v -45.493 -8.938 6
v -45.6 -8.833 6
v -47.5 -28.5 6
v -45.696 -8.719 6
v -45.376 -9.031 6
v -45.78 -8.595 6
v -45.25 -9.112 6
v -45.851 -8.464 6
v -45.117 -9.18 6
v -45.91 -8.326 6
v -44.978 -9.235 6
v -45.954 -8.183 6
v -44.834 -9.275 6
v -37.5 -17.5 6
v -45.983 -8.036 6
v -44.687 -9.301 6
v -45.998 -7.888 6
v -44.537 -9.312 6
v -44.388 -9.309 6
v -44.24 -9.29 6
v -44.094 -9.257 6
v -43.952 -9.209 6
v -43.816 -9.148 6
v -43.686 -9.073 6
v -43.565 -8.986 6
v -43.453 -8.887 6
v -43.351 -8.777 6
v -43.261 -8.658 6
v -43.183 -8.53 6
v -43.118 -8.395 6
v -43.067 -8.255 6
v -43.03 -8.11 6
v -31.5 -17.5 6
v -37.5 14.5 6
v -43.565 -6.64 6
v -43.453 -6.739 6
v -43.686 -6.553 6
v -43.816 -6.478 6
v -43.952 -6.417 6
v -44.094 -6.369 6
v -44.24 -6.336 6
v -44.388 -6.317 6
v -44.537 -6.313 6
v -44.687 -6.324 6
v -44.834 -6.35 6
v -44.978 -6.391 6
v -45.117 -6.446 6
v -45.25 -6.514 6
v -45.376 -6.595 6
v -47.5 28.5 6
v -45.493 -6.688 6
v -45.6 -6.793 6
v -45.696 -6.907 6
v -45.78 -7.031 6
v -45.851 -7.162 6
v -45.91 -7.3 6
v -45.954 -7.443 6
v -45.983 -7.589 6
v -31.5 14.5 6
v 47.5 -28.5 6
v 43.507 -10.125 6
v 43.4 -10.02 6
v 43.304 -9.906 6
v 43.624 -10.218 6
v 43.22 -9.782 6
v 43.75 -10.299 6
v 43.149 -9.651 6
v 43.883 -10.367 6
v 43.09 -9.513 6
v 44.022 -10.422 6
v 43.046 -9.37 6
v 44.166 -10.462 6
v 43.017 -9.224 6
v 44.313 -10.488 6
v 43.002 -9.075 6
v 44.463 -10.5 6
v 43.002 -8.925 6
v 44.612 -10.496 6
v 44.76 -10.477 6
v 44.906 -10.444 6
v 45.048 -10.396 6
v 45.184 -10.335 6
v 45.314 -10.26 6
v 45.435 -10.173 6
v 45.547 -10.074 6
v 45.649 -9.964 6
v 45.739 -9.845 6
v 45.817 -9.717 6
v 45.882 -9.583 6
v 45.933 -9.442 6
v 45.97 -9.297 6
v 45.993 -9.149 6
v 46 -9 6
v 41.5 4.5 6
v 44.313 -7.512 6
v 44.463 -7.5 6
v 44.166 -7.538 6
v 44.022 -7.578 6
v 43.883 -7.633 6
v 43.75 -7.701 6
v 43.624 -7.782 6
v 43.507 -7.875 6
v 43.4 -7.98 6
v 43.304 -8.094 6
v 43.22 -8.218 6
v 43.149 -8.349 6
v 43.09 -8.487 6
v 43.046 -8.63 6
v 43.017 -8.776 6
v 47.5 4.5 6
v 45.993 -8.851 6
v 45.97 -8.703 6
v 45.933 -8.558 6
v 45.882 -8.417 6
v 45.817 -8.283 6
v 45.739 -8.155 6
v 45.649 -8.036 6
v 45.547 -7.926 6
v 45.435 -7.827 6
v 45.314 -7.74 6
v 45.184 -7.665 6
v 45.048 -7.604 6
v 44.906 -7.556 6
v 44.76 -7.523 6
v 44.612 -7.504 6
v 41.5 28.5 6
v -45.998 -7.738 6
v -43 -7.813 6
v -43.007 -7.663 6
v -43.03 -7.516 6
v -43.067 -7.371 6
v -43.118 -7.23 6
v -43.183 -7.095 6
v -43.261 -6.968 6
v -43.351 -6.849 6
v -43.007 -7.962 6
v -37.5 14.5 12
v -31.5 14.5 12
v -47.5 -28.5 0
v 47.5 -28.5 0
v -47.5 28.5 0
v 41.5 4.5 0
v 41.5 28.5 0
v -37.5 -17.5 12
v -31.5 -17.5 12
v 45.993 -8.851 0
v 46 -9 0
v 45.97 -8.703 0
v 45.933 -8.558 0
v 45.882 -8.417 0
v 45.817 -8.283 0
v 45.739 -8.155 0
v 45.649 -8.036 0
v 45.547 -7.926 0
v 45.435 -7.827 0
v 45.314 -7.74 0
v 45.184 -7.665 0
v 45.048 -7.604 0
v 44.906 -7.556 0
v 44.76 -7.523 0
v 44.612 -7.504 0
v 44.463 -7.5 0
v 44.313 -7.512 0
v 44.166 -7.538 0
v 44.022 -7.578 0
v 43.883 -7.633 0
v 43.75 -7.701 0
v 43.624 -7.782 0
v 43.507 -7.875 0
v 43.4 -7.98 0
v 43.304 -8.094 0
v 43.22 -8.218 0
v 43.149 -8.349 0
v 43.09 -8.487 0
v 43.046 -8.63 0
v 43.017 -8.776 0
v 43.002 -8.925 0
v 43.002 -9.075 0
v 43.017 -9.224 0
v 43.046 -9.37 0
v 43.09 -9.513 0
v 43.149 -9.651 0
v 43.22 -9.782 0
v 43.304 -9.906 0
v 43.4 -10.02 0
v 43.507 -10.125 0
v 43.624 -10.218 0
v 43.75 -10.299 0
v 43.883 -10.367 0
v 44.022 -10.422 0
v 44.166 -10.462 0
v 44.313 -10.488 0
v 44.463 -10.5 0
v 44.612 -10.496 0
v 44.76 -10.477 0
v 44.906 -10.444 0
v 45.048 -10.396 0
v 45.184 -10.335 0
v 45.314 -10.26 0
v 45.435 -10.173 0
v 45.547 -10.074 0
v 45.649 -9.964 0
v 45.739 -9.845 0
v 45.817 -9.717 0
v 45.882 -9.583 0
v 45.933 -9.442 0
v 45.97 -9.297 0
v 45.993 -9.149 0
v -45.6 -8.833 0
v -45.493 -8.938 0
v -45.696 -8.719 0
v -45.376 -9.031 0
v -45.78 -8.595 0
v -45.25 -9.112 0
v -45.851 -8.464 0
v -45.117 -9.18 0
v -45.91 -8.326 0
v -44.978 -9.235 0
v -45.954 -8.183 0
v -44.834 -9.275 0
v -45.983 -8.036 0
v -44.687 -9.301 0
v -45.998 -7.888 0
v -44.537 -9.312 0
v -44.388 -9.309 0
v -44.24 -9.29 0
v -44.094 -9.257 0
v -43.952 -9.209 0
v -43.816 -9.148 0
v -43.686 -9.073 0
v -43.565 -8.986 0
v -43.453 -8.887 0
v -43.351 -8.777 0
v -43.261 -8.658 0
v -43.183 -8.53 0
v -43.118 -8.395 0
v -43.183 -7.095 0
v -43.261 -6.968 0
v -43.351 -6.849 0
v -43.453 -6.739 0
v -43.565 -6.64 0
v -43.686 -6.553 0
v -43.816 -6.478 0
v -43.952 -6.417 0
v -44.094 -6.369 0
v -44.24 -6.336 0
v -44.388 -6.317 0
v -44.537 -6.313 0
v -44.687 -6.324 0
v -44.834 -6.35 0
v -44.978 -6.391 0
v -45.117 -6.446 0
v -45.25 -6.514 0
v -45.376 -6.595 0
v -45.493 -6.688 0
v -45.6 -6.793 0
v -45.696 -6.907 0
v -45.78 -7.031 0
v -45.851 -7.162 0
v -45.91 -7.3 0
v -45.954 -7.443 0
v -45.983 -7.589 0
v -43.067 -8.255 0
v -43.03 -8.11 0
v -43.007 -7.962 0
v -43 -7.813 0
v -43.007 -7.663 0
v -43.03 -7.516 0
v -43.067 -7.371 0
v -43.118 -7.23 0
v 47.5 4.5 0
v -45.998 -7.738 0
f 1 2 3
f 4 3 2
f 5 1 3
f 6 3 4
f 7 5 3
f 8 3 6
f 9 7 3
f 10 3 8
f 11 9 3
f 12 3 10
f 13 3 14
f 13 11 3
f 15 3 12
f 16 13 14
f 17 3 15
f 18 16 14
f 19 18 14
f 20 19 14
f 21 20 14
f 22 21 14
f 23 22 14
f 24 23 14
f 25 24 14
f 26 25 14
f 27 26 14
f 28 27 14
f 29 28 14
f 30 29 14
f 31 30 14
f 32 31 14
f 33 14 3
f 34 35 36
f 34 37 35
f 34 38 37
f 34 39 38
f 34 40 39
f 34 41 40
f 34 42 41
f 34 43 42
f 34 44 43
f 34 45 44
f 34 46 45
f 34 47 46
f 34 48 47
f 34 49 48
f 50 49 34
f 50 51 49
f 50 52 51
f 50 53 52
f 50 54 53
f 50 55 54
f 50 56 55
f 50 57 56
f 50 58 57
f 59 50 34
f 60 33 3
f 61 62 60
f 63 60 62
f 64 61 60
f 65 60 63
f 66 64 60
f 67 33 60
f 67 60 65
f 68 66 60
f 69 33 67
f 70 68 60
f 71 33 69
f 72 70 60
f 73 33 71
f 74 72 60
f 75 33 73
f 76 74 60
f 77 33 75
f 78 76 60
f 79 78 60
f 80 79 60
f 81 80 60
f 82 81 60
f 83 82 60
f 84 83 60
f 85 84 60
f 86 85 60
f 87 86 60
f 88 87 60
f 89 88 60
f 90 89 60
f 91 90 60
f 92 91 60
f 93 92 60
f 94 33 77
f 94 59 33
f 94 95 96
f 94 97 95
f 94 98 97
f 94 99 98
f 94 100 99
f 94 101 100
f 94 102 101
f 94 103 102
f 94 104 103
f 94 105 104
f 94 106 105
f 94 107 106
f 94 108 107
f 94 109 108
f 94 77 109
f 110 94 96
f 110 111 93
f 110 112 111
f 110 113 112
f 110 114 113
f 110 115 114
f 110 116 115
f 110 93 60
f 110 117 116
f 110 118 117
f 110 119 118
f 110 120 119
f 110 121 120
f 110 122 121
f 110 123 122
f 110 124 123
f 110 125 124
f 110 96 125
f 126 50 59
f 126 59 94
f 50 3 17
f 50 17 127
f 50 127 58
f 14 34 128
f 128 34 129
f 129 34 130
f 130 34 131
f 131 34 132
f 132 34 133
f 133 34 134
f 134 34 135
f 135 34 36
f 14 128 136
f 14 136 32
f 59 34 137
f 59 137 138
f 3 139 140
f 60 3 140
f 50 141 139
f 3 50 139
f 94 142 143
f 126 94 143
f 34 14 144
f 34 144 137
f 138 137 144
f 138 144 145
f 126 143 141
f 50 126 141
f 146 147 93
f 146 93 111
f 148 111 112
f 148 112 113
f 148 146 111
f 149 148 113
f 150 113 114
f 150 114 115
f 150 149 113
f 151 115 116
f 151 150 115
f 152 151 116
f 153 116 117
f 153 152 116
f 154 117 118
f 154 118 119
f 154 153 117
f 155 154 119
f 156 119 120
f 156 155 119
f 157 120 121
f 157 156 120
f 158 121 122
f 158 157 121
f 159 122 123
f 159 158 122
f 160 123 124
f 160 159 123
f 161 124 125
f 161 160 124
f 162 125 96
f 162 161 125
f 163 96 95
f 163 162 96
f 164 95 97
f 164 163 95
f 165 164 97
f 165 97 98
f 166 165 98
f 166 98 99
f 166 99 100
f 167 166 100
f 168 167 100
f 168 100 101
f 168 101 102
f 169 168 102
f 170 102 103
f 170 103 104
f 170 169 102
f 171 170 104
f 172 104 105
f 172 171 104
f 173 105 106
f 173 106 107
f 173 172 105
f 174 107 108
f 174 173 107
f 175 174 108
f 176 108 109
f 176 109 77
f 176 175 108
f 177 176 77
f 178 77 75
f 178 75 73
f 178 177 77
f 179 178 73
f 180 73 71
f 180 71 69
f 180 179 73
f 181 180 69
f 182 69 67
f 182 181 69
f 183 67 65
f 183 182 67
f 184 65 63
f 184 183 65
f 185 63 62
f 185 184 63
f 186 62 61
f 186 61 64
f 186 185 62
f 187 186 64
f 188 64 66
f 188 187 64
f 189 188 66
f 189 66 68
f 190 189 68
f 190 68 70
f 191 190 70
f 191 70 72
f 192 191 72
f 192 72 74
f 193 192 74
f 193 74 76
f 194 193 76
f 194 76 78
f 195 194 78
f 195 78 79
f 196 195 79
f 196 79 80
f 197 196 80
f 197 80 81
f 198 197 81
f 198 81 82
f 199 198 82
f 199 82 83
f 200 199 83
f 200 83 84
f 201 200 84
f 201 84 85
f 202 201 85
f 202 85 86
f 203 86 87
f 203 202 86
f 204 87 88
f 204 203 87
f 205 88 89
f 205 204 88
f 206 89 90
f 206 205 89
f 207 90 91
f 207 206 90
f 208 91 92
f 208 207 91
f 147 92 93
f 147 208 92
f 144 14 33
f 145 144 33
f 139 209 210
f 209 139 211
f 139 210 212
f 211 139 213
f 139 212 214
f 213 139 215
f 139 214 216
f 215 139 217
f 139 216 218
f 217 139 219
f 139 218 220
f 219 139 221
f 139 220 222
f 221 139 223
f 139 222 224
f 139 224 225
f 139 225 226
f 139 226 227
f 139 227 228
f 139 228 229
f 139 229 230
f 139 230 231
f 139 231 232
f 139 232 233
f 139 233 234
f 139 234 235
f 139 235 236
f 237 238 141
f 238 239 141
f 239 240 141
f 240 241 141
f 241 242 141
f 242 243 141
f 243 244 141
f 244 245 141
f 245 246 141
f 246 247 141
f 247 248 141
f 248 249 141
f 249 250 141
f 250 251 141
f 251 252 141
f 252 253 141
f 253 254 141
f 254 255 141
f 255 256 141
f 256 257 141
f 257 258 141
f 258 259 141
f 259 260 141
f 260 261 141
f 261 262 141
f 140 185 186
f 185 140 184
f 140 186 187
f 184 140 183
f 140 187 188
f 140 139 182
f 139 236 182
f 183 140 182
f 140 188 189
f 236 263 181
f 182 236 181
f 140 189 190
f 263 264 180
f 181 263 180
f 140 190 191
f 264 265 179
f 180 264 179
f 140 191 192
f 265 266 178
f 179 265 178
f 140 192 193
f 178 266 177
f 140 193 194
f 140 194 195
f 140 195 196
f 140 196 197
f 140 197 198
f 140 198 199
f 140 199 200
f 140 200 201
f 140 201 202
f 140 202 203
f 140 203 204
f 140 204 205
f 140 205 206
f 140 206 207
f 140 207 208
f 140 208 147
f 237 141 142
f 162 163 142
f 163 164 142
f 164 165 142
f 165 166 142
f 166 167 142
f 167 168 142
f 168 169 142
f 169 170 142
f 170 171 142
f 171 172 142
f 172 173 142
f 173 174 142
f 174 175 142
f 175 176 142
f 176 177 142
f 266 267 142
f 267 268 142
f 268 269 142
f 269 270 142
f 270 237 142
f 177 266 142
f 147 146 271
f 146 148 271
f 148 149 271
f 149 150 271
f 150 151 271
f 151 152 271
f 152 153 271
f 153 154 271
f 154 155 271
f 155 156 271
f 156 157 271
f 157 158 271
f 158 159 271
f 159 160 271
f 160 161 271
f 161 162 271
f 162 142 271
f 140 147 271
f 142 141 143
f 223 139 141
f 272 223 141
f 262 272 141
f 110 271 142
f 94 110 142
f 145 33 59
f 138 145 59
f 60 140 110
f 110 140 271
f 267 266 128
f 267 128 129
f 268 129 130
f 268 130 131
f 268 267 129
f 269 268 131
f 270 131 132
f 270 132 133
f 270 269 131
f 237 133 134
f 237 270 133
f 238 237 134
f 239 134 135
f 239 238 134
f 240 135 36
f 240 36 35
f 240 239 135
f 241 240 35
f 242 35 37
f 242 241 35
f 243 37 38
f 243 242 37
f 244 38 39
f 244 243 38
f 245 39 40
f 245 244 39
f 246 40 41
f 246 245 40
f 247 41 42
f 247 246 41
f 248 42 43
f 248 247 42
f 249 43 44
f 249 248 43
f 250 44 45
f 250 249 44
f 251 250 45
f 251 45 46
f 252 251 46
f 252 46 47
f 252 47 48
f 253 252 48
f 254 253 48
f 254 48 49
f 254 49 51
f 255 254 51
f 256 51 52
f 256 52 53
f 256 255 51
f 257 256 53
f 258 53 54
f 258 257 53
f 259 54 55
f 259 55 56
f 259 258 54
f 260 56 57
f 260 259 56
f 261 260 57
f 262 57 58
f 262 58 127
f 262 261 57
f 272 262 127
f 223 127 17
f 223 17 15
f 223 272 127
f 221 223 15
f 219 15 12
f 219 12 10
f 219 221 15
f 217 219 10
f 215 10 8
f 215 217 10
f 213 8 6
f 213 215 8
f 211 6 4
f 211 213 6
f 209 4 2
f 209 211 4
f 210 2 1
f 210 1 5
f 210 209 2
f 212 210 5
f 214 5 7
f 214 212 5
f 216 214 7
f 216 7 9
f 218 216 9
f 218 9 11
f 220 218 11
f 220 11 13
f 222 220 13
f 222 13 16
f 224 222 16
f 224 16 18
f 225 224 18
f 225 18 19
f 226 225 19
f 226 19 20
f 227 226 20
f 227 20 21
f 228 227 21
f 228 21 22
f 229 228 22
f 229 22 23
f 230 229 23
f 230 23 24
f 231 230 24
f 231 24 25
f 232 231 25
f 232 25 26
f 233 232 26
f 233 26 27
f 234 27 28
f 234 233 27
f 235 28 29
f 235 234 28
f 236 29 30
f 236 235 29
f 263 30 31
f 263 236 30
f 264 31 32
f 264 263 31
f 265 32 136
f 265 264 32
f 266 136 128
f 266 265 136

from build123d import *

# Parameters (mm, degrees)
SKETCH1_R           = 1.5
BOSS_EXTRUDE2_DEPTH = 6
SKETCH3_W           = 6
SKETCH3_H           = 32
BOSS_EXTRUDE3_DEPTH = 6


with BuildPart() as part:
    # Sketch1 → Boss-Extrude2 (new body)
    with BuildSketch(Plane.XY):
        Polygon((-47.5, -28.5), (47.5, -28.5), (47.5, 4.5), (41.5, 4.5), (41.5, 28.5), (-47.5, 28.5), align=None)
        with Locations((44.5, -9)):
            Circle(SKETCH1_R, mode=Mode.SUBTRACT)
        with Locations((-44.5, -7.812839041)):
            Circle(SKETCH1_R, mode=Mode.SUBTRACT)
    extrude(amount=BOSS_EXTRUDE2_DEPTH)

    # Sketch3 → Boss-Extrude3 (add)
    with BuildSketch(Plane.XY.offset(6)):
        with Locations((-34.5, -1.5)):
            Rectangle(SKETCH3_W, SKETCH3_H)
    extrude(amount=BOSS_EXTRUDE3_DEPTH)


solid = part.part
